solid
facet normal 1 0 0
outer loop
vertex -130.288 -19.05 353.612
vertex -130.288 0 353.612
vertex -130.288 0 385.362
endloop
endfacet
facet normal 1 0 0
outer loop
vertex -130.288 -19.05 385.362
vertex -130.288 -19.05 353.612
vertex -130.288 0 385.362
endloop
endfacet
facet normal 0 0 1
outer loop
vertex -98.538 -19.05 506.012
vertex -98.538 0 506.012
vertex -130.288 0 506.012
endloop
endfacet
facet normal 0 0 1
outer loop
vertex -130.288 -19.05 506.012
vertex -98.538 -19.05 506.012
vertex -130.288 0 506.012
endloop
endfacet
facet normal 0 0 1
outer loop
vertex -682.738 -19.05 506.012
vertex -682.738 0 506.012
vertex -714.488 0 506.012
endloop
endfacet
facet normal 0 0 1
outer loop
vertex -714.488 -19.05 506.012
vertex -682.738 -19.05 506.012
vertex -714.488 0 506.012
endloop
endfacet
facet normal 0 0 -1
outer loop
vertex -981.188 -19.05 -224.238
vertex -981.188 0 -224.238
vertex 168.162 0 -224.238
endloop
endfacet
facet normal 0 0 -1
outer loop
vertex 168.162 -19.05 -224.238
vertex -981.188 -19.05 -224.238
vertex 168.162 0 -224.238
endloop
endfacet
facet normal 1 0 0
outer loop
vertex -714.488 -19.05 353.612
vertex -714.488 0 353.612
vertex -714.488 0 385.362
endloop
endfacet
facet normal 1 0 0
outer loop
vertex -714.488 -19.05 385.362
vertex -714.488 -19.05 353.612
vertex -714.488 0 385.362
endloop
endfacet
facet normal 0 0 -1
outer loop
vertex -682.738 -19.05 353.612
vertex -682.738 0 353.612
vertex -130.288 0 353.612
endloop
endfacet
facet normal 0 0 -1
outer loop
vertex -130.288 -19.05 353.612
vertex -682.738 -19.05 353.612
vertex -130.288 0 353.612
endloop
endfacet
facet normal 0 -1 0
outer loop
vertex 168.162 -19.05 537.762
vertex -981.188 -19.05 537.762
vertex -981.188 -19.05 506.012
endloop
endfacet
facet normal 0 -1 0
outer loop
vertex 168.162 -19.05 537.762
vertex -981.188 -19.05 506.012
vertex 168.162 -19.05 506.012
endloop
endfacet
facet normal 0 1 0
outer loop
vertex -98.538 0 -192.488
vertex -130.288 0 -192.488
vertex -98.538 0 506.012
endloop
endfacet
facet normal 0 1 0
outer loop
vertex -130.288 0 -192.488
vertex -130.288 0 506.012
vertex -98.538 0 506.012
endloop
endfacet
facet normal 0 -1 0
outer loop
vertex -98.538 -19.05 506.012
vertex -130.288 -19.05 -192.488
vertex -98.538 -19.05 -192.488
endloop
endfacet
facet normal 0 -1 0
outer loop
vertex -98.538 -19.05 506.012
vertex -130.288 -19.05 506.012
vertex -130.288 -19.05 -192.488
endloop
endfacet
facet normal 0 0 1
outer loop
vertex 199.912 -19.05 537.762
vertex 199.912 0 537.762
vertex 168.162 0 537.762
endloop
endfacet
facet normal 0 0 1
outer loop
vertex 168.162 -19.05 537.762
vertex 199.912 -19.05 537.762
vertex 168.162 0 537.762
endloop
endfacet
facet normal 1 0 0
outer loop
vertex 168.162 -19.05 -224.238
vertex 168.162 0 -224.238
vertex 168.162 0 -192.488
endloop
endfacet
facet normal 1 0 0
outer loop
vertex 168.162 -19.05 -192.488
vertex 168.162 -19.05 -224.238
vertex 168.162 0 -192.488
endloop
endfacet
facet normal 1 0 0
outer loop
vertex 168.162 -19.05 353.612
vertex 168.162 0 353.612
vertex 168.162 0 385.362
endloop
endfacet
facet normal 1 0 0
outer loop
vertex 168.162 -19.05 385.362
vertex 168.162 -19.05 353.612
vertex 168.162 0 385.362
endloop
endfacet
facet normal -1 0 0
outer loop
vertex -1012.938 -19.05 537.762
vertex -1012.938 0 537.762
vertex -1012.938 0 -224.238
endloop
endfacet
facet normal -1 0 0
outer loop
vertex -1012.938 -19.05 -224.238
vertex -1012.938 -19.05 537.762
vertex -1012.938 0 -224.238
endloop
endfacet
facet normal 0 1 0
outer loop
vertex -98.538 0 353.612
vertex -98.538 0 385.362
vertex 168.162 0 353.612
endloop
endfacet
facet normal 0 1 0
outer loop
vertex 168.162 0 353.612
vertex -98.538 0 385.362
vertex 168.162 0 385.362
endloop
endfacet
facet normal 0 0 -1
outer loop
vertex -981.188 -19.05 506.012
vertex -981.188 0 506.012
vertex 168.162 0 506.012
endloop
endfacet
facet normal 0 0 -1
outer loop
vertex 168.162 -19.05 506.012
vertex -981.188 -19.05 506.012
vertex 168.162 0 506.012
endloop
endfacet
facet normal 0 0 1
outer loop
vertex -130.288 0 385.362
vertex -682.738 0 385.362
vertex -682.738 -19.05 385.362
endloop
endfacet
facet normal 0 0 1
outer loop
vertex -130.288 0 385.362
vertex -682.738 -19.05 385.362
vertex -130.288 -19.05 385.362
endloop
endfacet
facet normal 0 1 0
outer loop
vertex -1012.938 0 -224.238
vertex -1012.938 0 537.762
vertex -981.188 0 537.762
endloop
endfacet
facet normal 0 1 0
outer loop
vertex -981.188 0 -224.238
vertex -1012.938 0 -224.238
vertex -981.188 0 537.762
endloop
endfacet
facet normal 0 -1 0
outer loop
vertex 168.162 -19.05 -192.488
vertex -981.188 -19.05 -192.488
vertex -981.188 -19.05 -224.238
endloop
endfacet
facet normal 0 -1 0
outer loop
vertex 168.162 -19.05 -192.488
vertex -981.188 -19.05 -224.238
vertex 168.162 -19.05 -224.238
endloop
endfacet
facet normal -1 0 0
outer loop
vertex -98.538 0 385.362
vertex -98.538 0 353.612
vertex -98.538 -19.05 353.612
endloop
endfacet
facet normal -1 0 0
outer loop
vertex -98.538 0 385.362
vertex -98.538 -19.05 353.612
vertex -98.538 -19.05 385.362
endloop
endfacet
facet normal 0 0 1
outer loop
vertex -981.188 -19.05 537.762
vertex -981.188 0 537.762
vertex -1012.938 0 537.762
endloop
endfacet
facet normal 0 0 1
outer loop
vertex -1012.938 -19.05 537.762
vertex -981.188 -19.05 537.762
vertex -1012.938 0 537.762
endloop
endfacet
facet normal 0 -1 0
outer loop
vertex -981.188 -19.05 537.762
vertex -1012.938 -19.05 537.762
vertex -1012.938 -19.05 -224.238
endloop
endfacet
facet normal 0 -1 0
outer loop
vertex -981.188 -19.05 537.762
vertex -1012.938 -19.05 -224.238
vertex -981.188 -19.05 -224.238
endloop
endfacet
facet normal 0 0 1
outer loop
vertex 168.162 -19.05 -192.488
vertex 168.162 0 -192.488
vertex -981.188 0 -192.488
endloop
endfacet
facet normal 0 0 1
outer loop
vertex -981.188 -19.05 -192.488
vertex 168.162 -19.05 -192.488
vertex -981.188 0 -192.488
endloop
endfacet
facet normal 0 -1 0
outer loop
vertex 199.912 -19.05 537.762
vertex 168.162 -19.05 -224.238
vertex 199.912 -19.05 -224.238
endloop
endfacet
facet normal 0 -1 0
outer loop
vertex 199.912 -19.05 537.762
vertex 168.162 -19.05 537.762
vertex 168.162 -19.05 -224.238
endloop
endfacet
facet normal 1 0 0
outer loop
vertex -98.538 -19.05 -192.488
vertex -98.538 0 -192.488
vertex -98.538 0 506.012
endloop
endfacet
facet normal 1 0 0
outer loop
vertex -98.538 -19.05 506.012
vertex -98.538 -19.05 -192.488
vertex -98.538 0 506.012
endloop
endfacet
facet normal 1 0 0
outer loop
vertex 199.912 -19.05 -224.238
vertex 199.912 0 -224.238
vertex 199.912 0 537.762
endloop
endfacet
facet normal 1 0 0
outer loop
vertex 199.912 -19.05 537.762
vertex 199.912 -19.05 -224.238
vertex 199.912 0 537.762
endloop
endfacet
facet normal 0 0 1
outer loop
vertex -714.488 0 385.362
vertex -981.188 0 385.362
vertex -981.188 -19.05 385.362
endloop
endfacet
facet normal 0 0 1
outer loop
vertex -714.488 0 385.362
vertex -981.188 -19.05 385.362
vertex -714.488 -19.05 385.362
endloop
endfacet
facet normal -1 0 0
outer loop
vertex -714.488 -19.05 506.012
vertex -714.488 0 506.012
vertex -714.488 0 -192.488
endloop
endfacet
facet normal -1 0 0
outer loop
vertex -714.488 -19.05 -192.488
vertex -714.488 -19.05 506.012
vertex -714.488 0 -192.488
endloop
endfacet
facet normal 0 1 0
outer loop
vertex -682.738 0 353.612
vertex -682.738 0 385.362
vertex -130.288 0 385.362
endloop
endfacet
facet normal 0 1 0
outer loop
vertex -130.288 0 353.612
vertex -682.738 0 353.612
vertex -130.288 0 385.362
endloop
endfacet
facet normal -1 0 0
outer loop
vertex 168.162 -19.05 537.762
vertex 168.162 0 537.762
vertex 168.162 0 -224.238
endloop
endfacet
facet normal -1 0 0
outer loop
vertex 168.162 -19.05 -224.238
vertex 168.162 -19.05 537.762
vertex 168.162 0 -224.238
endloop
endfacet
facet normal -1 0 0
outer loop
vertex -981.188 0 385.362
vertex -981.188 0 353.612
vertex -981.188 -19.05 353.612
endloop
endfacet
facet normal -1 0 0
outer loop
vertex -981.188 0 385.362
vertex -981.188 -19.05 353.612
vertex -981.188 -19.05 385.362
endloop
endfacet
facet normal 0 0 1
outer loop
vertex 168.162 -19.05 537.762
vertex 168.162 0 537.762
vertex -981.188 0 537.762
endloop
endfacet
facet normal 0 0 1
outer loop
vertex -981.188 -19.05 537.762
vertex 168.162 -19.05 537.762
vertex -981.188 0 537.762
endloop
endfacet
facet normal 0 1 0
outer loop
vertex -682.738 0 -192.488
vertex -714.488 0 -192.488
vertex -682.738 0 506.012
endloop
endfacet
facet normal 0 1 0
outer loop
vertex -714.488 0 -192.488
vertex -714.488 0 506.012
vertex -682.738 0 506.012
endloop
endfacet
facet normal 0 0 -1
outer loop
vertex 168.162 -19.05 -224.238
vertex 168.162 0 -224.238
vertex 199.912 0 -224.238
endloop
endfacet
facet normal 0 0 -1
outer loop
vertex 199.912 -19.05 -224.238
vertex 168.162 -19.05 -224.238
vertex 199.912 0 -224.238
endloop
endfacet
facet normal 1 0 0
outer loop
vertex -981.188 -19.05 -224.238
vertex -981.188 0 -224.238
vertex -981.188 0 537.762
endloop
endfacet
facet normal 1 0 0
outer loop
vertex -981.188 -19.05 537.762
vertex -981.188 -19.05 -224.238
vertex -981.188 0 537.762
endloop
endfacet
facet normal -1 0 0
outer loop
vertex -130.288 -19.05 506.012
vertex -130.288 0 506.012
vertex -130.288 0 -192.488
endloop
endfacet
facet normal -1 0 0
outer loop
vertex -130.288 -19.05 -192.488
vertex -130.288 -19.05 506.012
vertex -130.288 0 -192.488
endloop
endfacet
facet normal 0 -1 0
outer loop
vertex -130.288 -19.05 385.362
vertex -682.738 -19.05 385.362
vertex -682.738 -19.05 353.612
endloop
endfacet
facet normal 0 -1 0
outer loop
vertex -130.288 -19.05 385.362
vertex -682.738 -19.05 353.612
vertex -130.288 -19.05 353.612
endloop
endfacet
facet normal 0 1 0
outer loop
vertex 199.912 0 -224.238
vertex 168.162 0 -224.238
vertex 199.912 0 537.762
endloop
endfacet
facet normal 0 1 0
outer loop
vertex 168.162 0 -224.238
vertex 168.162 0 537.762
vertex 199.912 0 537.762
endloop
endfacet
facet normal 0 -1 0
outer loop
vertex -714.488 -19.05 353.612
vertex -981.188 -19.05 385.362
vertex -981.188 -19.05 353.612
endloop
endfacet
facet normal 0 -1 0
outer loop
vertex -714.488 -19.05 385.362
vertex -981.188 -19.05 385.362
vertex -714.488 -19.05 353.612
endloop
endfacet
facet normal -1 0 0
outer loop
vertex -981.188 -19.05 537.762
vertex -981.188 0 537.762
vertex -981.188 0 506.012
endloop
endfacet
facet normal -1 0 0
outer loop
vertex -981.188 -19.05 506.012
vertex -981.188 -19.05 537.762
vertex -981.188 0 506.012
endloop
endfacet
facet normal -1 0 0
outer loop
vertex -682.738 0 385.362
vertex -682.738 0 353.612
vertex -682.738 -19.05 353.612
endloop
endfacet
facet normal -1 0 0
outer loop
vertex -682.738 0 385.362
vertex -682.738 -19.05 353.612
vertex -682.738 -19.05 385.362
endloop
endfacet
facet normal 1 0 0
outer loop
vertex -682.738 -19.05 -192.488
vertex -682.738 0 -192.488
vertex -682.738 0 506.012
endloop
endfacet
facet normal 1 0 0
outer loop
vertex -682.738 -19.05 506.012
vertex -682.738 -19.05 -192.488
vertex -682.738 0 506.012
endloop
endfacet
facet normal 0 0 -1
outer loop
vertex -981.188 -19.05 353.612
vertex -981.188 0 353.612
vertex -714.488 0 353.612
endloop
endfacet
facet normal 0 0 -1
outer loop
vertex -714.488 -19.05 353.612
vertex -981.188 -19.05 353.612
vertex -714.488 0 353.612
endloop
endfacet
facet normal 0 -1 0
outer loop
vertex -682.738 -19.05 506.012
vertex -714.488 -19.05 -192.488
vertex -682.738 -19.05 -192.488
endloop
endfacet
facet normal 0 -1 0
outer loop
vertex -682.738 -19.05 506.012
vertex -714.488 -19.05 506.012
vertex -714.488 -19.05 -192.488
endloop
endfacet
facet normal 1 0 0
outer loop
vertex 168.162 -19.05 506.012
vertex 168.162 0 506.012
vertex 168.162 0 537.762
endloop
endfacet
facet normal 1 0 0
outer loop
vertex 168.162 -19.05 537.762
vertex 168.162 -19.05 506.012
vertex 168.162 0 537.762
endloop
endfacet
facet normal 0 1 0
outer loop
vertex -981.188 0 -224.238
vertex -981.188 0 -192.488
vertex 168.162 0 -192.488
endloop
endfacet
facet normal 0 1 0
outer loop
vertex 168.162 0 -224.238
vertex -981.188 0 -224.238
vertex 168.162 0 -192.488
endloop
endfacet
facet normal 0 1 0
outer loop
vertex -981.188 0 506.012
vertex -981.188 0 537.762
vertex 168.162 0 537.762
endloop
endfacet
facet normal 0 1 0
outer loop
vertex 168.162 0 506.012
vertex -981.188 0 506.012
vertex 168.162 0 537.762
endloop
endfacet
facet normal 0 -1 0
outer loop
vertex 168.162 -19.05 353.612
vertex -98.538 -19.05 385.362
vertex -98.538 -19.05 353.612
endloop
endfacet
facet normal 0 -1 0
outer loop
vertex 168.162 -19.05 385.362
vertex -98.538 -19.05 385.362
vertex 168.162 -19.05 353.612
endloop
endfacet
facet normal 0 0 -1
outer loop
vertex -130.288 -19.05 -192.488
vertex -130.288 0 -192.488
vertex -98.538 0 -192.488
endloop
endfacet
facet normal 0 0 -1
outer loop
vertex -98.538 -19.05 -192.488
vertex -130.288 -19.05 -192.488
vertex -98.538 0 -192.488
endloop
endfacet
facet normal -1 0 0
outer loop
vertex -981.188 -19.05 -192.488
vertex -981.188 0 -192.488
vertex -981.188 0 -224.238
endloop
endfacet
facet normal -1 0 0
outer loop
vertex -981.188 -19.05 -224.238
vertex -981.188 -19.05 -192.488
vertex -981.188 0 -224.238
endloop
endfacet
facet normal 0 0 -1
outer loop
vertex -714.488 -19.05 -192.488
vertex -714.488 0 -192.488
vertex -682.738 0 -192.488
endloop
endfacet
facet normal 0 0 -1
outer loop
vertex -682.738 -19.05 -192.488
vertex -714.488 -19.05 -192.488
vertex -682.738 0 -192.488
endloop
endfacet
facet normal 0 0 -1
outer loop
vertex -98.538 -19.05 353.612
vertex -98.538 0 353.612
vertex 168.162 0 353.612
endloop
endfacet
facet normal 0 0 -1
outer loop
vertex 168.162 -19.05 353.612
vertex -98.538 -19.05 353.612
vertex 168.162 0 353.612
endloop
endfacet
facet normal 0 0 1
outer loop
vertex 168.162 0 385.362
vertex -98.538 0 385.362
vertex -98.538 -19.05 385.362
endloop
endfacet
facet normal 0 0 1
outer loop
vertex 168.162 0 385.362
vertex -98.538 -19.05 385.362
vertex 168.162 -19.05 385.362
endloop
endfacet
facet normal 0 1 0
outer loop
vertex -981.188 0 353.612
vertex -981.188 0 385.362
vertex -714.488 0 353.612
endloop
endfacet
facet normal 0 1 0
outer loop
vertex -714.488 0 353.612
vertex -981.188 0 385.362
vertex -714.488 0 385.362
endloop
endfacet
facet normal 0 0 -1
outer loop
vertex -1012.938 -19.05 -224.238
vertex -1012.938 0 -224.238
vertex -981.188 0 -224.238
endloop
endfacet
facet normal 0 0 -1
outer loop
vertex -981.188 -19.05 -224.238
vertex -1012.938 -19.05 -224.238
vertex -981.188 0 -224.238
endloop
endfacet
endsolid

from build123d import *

# Parameters (mm, degrees)
F1_DEPTH = 19.05
F0_W     = 266.7
F0_H     = 31.75
F0_W_2   = 552.45
F2_DEPTH = 19.05


with BuildPart() as f1:
    # F0 (on Front) → F1 (new body)
    with BuildSketch(Plane.XZ):
        Polygon((-981.188244, 506.011576), (-981.188244, 537.761576), (-1012.938244, 537.761576), (-1012.938244, -224.238424), (-981.188244, -224.238424), (-981.188244, -192.488424), (-981.188244, 353.611576), (-981.188244, 385.361576), align=None)
        Polygon((-714.488244, -192.488424), (-682.738244, -192.488424), (-682.738244, 353.611576), (-682.738244, 385.361576), (-682.738244, 506.011576), (-714.488244, 506.011576), (-714.488244, 385.361576), (-714.488244, 353.611576), align=None)
        Polygon((-130.288244, -192.488424), (-98.538244, -192.488424), (-98.538244, 353.611576), (-98.538244, 385.361576), (-98.538244, 506.011576), (-130.288244, 506.011576), (-130.288244, 385.361576), (-130.288244, 353.611576), align=None)
        Polygon((168.161756, -224.238424), (199.911756, -224.238424), (199.911756, 537.761576), (168.161756, 537.761576), (168.161756, 506.011576), (168.161756, 385.361576), (168.161756, 353.611576), (168.161756, -192.488424), align=None)
    extrude(amount=F1_DEPTH)


with BuildPart() as f2:
    # F0 (on Front) → F2 (new body)
    with BuildSketch(Plane.XZ):
        Polygon((168.161756, 506.011576), (168.161756, 537.761576), (-981.188244, 537.761576), (-981.188244, 506.011576), (-714.488244, 506.011576), (-682.738244, 506.011576), (-130.288244, 506.011576), (-98.538244, 506.011576), align=None)
        with Locations((-847.838244, 369.486576)):
            Rectangle(F0_W, F0_H)
        with Locations((-406.513244, 369.486576)):
            Rectangle(F0_W_2, F0_H)
        with Locations((34.811756, 369.486576)):
            Rectangle(F0_W, F0_H)
        Polygon((-130.288244, -224.238424), (168.161756, -224.238424), (168.161756, -192.488424), (-98.538244, -192.488424), (-130.288244, -192.488424), (-682.738244, -192.488424), (-714.488244, -192.488424), (-981.188244, -192.488424), (-981.188244, -224.238424), (-682.738244, -224.238424), align=None)
    extrude(amount=F2_DEPTH)


solid = Compound([f1.part, f2.part])
